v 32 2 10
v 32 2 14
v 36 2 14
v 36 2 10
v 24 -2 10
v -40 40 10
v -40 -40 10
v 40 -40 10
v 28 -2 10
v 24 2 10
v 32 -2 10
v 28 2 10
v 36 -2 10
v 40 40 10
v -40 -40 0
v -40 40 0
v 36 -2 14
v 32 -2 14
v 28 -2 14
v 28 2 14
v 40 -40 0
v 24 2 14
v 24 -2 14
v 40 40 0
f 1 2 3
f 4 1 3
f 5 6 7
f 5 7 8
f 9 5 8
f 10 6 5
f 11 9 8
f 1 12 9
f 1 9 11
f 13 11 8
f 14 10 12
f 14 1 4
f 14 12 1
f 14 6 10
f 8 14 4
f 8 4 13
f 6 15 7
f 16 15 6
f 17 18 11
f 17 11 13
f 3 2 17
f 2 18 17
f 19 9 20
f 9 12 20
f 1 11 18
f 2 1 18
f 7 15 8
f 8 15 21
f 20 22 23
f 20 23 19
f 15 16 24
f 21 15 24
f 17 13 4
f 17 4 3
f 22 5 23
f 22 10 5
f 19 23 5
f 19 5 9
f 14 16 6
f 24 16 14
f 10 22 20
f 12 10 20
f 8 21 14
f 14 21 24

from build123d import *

# Parameters (mm, degrees)
F0_W     = 80
F0_H     = 80
F1_DEPTH = 10
F2_W     = 4
F2_H     = 4
F3_DEPTH = 2


with BuildPart() as f1:
    # F0 (on Top) → F1 (new body)
    with BuildSketch(Plane.XY):
        Rectangle(F0_W, F0_H)
    extrude(amount=F1_DEPTH)

    # F2 (on Front) → F3 (join, symmetric)
    with BuildSketch(Plane.XZ):
        with Locations((26, 12)):
            Rectangle(F2_W, F2_H)
        with Locations((34, 12)):
            Rectangle(F2_W, F2_H)
    extrude(amount=F3_DEPTH, both=True)


solid = f1.part
